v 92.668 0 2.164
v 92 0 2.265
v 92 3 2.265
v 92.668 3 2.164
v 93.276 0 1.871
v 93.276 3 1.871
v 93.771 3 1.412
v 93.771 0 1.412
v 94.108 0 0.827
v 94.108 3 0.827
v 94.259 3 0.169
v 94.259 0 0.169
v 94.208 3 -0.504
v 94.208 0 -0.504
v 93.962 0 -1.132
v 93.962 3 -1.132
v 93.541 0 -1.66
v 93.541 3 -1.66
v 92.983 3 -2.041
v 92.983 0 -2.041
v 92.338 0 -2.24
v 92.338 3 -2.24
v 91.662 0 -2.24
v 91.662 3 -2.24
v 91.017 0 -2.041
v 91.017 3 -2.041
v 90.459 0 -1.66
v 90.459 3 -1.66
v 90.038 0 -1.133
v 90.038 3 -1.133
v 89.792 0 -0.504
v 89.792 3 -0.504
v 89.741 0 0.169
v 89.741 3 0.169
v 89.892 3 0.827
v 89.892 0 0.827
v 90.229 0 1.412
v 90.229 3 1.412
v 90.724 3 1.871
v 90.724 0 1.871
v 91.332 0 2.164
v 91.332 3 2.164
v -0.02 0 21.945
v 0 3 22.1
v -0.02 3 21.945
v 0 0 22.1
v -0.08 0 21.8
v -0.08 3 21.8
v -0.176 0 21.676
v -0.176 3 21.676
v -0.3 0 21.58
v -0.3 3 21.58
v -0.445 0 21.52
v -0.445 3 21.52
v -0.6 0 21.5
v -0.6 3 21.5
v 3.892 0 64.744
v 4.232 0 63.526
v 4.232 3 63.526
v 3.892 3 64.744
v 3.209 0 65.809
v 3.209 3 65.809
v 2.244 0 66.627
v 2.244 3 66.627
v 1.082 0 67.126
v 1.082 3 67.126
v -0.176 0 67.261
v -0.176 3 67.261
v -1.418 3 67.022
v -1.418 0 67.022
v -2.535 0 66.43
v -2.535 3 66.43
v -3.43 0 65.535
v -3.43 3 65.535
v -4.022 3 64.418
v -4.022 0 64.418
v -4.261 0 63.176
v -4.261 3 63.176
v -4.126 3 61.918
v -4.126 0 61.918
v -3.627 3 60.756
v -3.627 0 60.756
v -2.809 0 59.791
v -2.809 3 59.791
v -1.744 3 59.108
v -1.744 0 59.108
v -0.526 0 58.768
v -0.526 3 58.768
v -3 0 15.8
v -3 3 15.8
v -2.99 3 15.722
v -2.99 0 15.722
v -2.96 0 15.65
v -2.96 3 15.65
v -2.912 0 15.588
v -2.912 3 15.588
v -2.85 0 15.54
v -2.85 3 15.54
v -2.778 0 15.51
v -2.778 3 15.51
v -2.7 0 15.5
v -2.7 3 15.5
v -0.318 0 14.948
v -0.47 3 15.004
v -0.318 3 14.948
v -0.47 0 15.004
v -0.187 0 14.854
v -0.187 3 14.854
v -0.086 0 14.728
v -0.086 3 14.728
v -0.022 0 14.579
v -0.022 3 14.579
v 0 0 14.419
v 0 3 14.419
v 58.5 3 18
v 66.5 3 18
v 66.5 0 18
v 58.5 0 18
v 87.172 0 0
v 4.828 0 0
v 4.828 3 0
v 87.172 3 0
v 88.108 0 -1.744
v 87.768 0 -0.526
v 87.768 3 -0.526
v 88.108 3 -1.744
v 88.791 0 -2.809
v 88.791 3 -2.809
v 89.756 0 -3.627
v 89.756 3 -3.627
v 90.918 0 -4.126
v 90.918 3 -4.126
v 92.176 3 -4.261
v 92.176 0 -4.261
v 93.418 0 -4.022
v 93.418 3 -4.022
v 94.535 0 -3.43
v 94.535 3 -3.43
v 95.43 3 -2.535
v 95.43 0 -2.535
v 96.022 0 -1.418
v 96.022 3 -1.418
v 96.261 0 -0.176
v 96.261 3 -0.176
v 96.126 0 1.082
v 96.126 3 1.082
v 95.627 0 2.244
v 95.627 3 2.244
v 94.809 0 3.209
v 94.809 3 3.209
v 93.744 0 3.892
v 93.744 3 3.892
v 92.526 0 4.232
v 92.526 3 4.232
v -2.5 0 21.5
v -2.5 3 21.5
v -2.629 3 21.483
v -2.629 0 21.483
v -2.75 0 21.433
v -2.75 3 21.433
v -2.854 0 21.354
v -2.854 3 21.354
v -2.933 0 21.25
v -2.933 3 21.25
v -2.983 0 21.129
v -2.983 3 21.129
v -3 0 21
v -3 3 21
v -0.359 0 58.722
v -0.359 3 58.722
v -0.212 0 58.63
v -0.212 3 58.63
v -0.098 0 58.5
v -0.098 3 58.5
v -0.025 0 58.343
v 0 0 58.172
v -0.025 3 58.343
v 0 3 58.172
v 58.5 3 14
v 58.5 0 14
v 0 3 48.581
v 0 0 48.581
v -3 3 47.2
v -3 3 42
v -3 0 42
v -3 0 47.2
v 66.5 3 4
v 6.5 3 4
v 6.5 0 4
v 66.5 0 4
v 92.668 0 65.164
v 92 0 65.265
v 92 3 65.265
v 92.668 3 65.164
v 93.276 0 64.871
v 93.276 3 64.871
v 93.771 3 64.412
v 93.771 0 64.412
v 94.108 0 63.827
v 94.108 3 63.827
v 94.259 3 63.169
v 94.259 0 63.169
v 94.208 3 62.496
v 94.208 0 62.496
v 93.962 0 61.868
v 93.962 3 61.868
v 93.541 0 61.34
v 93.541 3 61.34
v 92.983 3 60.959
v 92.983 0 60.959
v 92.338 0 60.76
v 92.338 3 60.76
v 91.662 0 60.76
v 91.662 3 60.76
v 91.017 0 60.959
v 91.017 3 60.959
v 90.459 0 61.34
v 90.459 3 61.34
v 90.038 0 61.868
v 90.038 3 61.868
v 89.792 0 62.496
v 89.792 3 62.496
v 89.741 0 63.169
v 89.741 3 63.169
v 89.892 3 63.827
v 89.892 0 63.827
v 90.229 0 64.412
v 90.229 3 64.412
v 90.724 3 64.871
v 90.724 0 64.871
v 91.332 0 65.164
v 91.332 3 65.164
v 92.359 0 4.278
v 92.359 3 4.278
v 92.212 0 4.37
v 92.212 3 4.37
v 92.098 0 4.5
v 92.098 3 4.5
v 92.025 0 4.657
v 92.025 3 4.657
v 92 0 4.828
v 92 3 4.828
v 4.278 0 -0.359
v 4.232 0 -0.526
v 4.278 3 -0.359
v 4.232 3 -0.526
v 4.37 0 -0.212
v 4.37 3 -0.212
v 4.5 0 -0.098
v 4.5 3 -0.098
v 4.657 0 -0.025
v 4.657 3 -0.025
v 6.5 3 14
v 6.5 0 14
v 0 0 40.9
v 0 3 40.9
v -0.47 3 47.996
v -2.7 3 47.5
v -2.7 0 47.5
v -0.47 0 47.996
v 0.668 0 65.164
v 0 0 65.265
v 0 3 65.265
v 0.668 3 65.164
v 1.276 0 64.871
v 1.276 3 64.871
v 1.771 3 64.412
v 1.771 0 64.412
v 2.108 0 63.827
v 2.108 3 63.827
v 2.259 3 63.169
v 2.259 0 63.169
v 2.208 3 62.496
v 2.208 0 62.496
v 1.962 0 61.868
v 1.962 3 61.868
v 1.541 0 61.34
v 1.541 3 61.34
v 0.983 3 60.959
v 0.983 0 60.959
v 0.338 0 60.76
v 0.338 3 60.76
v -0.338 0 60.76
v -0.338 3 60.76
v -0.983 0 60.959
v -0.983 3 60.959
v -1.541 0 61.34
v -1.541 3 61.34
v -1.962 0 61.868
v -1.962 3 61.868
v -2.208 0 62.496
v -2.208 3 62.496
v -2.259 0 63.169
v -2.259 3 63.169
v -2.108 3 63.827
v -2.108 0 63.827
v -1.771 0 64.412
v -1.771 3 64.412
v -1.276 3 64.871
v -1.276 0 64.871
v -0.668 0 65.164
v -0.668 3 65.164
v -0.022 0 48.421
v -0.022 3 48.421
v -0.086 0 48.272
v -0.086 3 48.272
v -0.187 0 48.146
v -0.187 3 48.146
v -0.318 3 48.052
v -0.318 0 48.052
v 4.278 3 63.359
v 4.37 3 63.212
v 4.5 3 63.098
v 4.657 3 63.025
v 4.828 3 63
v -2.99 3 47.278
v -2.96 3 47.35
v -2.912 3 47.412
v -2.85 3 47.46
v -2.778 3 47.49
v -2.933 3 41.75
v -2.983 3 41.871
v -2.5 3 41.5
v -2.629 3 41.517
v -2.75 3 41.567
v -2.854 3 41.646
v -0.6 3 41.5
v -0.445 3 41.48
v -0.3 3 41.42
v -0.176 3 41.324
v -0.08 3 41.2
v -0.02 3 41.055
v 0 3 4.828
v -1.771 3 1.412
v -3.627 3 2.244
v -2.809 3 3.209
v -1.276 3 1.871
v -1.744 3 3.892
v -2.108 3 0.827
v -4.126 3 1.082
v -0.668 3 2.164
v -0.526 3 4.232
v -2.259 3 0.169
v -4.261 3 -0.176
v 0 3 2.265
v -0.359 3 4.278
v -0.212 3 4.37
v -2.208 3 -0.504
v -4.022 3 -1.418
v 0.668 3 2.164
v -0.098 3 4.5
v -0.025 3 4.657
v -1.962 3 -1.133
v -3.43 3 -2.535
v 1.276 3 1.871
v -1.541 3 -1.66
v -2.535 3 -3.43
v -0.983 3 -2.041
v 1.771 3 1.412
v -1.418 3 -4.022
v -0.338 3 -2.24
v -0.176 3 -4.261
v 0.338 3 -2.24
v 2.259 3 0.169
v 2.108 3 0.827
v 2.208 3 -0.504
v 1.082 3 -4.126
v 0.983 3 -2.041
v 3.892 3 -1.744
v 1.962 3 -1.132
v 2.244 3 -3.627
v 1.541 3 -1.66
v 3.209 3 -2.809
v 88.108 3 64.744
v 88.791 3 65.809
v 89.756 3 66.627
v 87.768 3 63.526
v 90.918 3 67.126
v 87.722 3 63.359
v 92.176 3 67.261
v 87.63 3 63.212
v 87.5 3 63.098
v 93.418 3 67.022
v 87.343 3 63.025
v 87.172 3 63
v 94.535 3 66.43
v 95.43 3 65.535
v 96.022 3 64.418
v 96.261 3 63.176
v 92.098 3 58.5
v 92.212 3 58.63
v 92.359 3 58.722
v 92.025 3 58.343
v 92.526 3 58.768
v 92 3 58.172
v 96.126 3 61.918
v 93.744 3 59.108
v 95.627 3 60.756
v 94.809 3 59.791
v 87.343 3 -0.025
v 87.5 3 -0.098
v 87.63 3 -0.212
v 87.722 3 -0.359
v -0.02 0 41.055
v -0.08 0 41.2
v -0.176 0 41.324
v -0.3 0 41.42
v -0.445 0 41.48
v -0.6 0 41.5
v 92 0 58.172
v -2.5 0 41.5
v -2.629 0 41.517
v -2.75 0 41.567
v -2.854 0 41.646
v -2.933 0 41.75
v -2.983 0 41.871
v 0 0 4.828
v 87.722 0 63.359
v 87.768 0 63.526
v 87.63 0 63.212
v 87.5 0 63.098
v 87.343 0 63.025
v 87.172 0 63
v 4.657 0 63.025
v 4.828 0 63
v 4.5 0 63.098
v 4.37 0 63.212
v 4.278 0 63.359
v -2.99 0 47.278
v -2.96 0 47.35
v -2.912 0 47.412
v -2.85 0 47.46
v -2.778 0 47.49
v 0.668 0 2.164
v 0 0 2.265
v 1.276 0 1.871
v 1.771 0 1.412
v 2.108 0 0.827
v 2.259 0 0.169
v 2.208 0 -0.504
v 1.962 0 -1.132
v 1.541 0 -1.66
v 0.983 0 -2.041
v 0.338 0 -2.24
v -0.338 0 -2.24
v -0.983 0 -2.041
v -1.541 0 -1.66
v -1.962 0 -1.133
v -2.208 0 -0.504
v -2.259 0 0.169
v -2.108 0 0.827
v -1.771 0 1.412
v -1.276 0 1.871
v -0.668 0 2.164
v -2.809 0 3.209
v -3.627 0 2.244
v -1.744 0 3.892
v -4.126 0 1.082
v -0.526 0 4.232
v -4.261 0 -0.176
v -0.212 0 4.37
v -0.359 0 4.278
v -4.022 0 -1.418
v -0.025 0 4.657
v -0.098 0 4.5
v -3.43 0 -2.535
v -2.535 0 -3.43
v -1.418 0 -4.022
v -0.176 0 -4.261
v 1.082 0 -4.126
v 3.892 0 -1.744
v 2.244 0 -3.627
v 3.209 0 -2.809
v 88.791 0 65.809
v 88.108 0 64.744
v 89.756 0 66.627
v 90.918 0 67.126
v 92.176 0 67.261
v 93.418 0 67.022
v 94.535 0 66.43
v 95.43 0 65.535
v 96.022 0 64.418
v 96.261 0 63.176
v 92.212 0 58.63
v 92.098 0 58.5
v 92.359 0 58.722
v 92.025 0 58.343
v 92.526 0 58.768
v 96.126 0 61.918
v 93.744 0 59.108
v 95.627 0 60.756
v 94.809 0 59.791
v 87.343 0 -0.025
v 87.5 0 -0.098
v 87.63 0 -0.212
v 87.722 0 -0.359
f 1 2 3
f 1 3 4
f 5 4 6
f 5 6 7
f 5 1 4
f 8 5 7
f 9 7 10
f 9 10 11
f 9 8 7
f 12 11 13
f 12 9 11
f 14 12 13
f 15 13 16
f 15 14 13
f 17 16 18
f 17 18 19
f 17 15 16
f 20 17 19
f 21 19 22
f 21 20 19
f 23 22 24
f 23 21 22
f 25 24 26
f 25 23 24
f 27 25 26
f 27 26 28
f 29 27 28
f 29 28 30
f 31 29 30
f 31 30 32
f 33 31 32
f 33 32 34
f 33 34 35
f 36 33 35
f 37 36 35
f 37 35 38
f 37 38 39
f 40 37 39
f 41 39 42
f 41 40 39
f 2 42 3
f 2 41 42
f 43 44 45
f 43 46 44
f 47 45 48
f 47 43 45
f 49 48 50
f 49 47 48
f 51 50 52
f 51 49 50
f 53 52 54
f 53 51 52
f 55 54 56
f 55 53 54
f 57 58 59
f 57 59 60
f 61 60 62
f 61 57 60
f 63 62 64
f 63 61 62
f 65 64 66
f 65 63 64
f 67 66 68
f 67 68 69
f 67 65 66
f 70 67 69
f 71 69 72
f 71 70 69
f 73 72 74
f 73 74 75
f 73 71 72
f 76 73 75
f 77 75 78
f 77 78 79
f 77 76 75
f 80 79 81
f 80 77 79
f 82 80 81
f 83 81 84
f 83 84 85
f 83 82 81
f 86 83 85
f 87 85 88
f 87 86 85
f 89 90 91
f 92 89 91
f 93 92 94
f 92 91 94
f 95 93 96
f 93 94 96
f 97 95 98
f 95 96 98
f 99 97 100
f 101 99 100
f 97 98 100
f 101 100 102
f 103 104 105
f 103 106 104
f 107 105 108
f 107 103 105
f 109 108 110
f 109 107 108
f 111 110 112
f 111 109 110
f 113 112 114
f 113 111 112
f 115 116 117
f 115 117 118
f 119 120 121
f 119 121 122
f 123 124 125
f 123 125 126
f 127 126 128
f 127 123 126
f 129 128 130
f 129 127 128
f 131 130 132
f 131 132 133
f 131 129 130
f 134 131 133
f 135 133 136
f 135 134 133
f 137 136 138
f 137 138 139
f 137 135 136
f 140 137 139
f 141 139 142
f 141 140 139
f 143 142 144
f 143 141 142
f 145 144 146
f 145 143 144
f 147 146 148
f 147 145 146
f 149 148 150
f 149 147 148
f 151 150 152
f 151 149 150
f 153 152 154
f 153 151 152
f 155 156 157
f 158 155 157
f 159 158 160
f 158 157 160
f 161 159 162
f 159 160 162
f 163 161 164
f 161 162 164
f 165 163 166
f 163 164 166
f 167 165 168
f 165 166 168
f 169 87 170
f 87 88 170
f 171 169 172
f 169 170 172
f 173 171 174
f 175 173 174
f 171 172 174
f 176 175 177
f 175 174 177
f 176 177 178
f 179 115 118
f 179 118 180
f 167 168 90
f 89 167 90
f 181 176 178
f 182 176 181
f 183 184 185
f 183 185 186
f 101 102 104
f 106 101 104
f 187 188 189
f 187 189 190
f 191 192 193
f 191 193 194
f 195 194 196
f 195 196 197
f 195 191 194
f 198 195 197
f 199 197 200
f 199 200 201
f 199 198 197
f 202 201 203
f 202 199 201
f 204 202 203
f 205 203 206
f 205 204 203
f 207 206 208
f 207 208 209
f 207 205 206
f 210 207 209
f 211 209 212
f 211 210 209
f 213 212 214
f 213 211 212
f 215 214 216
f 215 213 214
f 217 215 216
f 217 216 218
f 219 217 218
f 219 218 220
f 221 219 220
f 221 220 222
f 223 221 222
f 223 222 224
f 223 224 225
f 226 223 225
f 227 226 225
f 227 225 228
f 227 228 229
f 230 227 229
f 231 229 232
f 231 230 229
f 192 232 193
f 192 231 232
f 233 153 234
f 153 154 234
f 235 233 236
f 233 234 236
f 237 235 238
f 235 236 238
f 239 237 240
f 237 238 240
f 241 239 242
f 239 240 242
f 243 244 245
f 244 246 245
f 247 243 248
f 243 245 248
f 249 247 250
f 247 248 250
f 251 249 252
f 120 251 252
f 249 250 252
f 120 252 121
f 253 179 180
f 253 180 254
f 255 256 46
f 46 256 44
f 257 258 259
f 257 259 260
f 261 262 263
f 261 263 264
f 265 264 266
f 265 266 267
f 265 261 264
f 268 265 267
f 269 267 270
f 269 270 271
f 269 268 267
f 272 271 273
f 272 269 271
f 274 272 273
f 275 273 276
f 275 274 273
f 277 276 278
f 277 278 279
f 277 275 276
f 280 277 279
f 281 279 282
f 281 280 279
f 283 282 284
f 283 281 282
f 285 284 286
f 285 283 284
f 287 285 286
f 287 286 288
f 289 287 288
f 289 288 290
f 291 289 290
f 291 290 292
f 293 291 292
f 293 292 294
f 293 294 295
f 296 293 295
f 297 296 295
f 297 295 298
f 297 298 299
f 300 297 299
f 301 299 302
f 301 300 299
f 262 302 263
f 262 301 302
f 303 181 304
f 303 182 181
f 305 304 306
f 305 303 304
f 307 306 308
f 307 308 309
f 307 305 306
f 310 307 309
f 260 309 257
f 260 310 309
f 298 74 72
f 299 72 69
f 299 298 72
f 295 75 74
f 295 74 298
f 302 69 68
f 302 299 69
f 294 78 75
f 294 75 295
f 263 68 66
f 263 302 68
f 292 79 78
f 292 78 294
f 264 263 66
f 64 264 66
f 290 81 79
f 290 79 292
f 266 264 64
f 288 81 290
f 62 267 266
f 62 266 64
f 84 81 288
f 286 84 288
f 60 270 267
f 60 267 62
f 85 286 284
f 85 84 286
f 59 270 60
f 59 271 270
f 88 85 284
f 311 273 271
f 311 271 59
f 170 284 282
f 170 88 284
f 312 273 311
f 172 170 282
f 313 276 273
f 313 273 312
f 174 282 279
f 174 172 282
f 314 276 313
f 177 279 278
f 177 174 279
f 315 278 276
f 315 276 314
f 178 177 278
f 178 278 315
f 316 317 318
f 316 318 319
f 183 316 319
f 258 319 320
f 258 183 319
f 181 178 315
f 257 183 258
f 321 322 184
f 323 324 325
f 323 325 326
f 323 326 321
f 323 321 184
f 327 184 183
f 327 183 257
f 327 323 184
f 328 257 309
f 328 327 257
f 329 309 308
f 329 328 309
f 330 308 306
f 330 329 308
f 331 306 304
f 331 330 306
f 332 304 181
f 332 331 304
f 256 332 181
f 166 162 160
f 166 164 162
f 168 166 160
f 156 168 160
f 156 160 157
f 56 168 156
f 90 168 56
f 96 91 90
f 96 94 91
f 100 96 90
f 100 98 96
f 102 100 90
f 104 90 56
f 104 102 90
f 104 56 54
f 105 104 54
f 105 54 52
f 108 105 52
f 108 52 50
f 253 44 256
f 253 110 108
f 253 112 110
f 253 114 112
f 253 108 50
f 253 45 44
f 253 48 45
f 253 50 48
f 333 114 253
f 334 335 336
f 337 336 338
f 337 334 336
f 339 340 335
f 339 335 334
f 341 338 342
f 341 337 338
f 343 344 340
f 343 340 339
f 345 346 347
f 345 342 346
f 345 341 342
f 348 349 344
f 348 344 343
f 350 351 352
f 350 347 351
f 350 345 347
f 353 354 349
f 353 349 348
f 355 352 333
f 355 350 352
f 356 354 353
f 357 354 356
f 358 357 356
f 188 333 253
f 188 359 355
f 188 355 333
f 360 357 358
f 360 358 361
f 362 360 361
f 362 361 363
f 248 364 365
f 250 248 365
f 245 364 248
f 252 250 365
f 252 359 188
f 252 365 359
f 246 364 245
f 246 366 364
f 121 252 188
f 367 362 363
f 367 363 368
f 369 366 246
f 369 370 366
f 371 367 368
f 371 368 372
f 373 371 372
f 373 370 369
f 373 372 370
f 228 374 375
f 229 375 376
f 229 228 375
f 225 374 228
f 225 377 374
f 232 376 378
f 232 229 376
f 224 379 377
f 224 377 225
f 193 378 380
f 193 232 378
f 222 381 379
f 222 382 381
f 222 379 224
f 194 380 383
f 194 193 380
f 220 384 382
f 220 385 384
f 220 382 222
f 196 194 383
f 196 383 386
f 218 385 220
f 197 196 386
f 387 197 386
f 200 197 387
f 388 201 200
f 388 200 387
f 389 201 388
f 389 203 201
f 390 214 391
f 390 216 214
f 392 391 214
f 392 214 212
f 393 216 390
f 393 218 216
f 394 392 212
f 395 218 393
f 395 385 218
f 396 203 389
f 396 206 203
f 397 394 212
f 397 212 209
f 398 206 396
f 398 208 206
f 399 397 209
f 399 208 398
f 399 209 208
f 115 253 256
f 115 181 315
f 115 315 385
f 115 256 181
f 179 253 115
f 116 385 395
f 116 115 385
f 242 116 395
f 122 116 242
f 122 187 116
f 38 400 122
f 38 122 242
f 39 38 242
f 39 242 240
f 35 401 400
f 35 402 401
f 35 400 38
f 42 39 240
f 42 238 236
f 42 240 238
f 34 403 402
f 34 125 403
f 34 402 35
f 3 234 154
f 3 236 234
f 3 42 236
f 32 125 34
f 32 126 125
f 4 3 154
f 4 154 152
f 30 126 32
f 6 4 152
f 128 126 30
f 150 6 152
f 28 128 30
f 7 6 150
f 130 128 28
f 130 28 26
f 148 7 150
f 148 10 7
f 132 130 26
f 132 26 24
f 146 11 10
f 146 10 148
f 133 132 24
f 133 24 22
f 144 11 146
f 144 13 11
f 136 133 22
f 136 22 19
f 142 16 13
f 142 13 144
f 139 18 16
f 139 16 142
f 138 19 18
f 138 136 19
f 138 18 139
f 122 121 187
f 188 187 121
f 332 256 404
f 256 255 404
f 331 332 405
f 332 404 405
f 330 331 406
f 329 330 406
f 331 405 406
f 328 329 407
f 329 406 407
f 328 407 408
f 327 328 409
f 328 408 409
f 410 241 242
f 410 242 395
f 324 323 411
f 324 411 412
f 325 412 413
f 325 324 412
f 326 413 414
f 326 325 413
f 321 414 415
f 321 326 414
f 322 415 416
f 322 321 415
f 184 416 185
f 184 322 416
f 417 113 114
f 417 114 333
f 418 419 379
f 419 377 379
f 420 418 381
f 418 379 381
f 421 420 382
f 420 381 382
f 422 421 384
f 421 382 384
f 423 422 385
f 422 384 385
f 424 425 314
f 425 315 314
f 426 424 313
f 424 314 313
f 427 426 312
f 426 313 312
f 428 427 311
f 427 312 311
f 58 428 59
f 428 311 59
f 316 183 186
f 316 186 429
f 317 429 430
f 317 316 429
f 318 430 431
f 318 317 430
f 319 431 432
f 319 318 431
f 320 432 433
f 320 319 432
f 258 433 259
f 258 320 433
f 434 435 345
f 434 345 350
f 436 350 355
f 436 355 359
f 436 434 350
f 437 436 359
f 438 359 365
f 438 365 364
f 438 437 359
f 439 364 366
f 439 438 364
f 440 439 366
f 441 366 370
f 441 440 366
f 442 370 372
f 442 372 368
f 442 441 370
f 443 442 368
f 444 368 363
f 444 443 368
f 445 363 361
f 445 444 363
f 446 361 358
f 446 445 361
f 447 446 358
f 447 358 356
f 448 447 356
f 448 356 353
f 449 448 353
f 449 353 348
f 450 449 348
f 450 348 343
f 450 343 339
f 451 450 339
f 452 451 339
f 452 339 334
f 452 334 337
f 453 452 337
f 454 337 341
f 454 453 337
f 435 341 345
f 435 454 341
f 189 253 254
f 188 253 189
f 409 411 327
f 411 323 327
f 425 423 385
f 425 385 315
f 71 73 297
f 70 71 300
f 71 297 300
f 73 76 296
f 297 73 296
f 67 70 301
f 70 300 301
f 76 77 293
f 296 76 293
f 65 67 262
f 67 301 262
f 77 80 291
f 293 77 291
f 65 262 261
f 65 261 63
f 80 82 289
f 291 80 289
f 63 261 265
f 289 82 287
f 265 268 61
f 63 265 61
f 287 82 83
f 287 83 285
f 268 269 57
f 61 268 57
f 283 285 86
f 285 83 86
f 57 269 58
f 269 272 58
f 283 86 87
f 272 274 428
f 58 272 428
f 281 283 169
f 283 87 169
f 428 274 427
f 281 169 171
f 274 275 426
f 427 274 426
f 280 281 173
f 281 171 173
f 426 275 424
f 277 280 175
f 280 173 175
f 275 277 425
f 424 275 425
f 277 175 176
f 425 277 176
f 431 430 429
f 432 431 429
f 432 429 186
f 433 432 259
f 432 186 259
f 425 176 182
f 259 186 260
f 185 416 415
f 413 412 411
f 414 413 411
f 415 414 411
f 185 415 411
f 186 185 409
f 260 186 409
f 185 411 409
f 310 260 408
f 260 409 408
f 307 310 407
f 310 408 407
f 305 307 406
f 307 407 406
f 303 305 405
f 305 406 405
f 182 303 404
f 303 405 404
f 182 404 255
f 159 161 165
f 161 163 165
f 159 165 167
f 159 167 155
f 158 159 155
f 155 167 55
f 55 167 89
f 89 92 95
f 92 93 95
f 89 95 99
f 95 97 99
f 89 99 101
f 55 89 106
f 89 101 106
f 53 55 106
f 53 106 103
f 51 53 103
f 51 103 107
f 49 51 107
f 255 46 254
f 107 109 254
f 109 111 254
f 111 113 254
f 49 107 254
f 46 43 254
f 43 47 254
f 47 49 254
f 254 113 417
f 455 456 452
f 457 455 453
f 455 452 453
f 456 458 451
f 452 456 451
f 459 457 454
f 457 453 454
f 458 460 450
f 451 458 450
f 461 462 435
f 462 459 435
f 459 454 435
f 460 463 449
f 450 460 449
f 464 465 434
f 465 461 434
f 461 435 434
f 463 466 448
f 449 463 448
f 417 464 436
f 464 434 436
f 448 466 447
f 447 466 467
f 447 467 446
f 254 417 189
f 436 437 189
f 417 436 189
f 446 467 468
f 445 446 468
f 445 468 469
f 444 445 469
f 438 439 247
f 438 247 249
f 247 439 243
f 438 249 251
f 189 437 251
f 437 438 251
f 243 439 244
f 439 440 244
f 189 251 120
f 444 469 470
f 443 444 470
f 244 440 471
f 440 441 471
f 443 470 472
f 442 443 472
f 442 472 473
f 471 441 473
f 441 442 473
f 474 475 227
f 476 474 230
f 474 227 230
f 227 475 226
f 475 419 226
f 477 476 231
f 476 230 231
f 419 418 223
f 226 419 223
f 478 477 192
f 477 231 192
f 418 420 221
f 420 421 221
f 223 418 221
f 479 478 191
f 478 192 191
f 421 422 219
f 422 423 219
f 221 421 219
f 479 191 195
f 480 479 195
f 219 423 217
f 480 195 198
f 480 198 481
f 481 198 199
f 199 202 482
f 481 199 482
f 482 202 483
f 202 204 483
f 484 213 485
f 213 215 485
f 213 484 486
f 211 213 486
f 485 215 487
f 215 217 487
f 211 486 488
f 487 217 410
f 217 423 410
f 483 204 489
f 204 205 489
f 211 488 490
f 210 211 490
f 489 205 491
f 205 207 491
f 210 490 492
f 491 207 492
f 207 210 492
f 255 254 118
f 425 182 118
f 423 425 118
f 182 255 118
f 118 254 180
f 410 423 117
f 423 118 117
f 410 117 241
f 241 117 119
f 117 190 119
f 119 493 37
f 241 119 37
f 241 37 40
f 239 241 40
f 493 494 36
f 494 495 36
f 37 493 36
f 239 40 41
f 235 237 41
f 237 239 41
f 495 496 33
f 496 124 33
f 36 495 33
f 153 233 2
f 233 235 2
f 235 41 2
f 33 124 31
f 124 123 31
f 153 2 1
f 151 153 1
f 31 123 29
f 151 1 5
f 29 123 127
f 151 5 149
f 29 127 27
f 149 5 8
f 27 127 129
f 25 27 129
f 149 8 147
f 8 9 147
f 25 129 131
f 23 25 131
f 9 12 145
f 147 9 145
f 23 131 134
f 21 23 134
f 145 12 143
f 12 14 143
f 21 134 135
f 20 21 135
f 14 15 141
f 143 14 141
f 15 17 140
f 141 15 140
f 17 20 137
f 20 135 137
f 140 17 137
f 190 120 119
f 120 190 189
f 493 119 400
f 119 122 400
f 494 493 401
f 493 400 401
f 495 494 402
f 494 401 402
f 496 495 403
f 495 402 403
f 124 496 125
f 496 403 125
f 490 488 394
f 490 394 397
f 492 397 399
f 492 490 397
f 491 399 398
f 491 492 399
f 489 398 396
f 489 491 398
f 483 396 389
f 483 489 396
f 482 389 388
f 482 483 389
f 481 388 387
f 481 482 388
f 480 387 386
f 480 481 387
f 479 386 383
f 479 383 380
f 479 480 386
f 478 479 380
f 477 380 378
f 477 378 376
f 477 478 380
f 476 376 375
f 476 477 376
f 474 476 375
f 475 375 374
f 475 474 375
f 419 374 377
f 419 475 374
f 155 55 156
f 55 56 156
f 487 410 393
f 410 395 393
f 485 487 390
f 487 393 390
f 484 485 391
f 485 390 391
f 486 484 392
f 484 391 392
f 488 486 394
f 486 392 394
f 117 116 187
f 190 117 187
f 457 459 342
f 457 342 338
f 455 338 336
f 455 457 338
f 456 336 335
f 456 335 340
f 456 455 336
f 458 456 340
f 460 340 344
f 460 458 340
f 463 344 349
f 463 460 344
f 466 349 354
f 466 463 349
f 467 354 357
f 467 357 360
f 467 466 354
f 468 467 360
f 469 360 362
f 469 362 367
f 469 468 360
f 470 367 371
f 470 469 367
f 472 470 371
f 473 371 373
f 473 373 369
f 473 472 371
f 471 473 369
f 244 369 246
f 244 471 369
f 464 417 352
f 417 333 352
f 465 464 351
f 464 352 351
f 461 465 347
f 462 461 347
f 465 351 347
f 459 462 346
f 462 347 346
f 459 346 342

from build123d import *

# Parameters (mm, degrees)
SKETCH1_R           = 2.265
BOSS_EXTRUDE1_DEPTH = 3
CUT_EXTRUDE1_DEPTH  = 3
SKETCH3_W           = 6.5
SKETCH3_H           = 20
CUT_EXTRUDE2_DEPTH  = 3
BOSS_EXTRUDE2_DEPTH = 3
SKETCH5_W           = 6.5
SKETCH5_H           = 20
BOSS_EXTRUDE3_DEPTH = 3
FILLET1_R           = 0.6


with BuildPart() as part:
    # Sketch1 → Boss-Extrude1 (new body)
    with BuildSketch(Plane(origin=(0, 0, 0), x_dir=(1, 0, 0), z_dir=(0, 1, 0))):
        with BuildLine():
            Line((4.265, 0), (87.735, 0))
            ThreePointArc((87.735, 0), (95.015810422, 3.015810422), (92, -4.265))
            Line((92, -4.265), (92, -58.735))
            ThreePointArc((92, -58.735), (95.015810422, -66.015810422), (87.735, -63))
            Line((87.735, -63), (4.265, -63))
            ThreePointArc((4.265, -63), (-3.015810422, -66.015810422), (0, -58.735))
            Line((0, -58.735), (0, -4.265))
            ThreePointArc((0, -4.265), (-3.015810422, 3.015810422), (4.265, 0))
        make_face()
        with Locations(Location((0, 0, 0), (0, 0, 270))):
            Circle(SKETCH1_R, mode=Mode.SUBTRACT)
        with Locations(Location((92, 0, 0), (0, 0, 270))):
            Circle(SKETCH1_R, mode=Mode.SUBTRACT)
        with Locations(Location((92, -63, 0), (0, 0, 270))):
            Circle(SKETCH1_R, mode=Mode.SUBTRACT)
        with Locations(Location((0, -63, 0), (0, 0, 270))):
            Circle(SKETCH1_R, mode=Mode.SUBTRACT)
    extrude(amount=BOSS_EXTRUDE1_DEPTH)

    # Sketch2 → Cut-Extrude1 (cut)
    with BuildSketch(Plane(origin=(0, 3, 0), x_dir=(1, 0, 0), z_dir=(0, 1, 0))):
        Polygon((6.5, -4), (66.5, -4), (66.5, -14), (66.5, -18), (58.5, -18), (58.5, -14), (6.5, -14), align=None)
    extrude(amount=-CUT_EXTRUDE1_DEPTH, mode=Mode.SUBTRACT)

    # Sketch3 → Cut-Extrude2 (cut)
    with BuildSketch(Plane(origin=(0, 3, 0), x_dir=(1, 0, 0), z_dir=(0, 1, 0))):
        with Locations((3.25, -31.5)):
            Rectangle(SKETCH3_W, SKETCH3_H)
    extrude(amount=-CUT_EXTRUDE2_DEPTH, mode=Mode.SUBTRACT)

    # Sketch4 → Boss-Extrude2 (add)
    with BuildSketch(Plane(origin=(0, 3, 0), x_dir=(1, 0, 0), z_dir=(0, 1, 0))):
        with BuildLine():
            Line((-2.7, -15.5), (0, -14.9))
            Line((0, -14.9), (0, -21.5))
            Line((0, -21.5), (-2.5, -21.5))
            ThreePointArc((-2.5, -21.5), (-2.853553391, -21.353553391), (-3, -21))
            Line((-3, -21), (-3, -15.8))
            ThreePointArc((-3, -15.8), (-2.912132034, -15.587867966), (-2.7, -15.5))
        make_face()
        with BuildLine():
            Line((-3, -42), (-3, -47.2))
            ThreePointArc((-3, -47.2), (-2.912132034, -47.412132034), (-2.7, -47.5))
            Line((-2.7, -47.5), (0, -48.1))
            Line((0, -48.1), (0, -41.5))
            Line((0, -41.5), (-2.5, -41.5))
            ThreePointArc((-2.5, -41.5), (-2.853553391, -41.646446609), (-3, -42))
        make_face()
    extrude(amount=-BOSS_EXTRUDE2_DEPTH)

    # Sketch5 → Boss-Extrude3 (add)
    with BuildSketch(Plane(origin=(0, 3, 0), x_dir=(1, 0, 0), z_dir=(0, 1, 0))):
        with Locations((3.25, -31.5)):
            Rectangle(SKETCH5_W, SKETCH5_H)
    extrude(amount=-BOSS_EXTRUDE3_DEPTH)

    # Fillet1
    fillet1_edges = [part.edges().sort_by_distance(p)[0] for p in [
        (0, 1.5, 48.1),
        (0, 1.5, 41.5),
        (0, 1.5, 21.5),
        (92, 1.5, 4.265),
        (92, 1.5, 58.735),
        (87.735, 1.5, 63),
        (4.265, 1.5, 63),
        (0, 1.5, 58.735),
        (0, 1.5, 4.265),
        (4.265, 1.5, 0),
        (87.735, 1.5, 0),
        (0, 1.5, 14.9),
    ]]
    fillet(fillet1_edges, radius=FILLET1_R)


solid = part.part
